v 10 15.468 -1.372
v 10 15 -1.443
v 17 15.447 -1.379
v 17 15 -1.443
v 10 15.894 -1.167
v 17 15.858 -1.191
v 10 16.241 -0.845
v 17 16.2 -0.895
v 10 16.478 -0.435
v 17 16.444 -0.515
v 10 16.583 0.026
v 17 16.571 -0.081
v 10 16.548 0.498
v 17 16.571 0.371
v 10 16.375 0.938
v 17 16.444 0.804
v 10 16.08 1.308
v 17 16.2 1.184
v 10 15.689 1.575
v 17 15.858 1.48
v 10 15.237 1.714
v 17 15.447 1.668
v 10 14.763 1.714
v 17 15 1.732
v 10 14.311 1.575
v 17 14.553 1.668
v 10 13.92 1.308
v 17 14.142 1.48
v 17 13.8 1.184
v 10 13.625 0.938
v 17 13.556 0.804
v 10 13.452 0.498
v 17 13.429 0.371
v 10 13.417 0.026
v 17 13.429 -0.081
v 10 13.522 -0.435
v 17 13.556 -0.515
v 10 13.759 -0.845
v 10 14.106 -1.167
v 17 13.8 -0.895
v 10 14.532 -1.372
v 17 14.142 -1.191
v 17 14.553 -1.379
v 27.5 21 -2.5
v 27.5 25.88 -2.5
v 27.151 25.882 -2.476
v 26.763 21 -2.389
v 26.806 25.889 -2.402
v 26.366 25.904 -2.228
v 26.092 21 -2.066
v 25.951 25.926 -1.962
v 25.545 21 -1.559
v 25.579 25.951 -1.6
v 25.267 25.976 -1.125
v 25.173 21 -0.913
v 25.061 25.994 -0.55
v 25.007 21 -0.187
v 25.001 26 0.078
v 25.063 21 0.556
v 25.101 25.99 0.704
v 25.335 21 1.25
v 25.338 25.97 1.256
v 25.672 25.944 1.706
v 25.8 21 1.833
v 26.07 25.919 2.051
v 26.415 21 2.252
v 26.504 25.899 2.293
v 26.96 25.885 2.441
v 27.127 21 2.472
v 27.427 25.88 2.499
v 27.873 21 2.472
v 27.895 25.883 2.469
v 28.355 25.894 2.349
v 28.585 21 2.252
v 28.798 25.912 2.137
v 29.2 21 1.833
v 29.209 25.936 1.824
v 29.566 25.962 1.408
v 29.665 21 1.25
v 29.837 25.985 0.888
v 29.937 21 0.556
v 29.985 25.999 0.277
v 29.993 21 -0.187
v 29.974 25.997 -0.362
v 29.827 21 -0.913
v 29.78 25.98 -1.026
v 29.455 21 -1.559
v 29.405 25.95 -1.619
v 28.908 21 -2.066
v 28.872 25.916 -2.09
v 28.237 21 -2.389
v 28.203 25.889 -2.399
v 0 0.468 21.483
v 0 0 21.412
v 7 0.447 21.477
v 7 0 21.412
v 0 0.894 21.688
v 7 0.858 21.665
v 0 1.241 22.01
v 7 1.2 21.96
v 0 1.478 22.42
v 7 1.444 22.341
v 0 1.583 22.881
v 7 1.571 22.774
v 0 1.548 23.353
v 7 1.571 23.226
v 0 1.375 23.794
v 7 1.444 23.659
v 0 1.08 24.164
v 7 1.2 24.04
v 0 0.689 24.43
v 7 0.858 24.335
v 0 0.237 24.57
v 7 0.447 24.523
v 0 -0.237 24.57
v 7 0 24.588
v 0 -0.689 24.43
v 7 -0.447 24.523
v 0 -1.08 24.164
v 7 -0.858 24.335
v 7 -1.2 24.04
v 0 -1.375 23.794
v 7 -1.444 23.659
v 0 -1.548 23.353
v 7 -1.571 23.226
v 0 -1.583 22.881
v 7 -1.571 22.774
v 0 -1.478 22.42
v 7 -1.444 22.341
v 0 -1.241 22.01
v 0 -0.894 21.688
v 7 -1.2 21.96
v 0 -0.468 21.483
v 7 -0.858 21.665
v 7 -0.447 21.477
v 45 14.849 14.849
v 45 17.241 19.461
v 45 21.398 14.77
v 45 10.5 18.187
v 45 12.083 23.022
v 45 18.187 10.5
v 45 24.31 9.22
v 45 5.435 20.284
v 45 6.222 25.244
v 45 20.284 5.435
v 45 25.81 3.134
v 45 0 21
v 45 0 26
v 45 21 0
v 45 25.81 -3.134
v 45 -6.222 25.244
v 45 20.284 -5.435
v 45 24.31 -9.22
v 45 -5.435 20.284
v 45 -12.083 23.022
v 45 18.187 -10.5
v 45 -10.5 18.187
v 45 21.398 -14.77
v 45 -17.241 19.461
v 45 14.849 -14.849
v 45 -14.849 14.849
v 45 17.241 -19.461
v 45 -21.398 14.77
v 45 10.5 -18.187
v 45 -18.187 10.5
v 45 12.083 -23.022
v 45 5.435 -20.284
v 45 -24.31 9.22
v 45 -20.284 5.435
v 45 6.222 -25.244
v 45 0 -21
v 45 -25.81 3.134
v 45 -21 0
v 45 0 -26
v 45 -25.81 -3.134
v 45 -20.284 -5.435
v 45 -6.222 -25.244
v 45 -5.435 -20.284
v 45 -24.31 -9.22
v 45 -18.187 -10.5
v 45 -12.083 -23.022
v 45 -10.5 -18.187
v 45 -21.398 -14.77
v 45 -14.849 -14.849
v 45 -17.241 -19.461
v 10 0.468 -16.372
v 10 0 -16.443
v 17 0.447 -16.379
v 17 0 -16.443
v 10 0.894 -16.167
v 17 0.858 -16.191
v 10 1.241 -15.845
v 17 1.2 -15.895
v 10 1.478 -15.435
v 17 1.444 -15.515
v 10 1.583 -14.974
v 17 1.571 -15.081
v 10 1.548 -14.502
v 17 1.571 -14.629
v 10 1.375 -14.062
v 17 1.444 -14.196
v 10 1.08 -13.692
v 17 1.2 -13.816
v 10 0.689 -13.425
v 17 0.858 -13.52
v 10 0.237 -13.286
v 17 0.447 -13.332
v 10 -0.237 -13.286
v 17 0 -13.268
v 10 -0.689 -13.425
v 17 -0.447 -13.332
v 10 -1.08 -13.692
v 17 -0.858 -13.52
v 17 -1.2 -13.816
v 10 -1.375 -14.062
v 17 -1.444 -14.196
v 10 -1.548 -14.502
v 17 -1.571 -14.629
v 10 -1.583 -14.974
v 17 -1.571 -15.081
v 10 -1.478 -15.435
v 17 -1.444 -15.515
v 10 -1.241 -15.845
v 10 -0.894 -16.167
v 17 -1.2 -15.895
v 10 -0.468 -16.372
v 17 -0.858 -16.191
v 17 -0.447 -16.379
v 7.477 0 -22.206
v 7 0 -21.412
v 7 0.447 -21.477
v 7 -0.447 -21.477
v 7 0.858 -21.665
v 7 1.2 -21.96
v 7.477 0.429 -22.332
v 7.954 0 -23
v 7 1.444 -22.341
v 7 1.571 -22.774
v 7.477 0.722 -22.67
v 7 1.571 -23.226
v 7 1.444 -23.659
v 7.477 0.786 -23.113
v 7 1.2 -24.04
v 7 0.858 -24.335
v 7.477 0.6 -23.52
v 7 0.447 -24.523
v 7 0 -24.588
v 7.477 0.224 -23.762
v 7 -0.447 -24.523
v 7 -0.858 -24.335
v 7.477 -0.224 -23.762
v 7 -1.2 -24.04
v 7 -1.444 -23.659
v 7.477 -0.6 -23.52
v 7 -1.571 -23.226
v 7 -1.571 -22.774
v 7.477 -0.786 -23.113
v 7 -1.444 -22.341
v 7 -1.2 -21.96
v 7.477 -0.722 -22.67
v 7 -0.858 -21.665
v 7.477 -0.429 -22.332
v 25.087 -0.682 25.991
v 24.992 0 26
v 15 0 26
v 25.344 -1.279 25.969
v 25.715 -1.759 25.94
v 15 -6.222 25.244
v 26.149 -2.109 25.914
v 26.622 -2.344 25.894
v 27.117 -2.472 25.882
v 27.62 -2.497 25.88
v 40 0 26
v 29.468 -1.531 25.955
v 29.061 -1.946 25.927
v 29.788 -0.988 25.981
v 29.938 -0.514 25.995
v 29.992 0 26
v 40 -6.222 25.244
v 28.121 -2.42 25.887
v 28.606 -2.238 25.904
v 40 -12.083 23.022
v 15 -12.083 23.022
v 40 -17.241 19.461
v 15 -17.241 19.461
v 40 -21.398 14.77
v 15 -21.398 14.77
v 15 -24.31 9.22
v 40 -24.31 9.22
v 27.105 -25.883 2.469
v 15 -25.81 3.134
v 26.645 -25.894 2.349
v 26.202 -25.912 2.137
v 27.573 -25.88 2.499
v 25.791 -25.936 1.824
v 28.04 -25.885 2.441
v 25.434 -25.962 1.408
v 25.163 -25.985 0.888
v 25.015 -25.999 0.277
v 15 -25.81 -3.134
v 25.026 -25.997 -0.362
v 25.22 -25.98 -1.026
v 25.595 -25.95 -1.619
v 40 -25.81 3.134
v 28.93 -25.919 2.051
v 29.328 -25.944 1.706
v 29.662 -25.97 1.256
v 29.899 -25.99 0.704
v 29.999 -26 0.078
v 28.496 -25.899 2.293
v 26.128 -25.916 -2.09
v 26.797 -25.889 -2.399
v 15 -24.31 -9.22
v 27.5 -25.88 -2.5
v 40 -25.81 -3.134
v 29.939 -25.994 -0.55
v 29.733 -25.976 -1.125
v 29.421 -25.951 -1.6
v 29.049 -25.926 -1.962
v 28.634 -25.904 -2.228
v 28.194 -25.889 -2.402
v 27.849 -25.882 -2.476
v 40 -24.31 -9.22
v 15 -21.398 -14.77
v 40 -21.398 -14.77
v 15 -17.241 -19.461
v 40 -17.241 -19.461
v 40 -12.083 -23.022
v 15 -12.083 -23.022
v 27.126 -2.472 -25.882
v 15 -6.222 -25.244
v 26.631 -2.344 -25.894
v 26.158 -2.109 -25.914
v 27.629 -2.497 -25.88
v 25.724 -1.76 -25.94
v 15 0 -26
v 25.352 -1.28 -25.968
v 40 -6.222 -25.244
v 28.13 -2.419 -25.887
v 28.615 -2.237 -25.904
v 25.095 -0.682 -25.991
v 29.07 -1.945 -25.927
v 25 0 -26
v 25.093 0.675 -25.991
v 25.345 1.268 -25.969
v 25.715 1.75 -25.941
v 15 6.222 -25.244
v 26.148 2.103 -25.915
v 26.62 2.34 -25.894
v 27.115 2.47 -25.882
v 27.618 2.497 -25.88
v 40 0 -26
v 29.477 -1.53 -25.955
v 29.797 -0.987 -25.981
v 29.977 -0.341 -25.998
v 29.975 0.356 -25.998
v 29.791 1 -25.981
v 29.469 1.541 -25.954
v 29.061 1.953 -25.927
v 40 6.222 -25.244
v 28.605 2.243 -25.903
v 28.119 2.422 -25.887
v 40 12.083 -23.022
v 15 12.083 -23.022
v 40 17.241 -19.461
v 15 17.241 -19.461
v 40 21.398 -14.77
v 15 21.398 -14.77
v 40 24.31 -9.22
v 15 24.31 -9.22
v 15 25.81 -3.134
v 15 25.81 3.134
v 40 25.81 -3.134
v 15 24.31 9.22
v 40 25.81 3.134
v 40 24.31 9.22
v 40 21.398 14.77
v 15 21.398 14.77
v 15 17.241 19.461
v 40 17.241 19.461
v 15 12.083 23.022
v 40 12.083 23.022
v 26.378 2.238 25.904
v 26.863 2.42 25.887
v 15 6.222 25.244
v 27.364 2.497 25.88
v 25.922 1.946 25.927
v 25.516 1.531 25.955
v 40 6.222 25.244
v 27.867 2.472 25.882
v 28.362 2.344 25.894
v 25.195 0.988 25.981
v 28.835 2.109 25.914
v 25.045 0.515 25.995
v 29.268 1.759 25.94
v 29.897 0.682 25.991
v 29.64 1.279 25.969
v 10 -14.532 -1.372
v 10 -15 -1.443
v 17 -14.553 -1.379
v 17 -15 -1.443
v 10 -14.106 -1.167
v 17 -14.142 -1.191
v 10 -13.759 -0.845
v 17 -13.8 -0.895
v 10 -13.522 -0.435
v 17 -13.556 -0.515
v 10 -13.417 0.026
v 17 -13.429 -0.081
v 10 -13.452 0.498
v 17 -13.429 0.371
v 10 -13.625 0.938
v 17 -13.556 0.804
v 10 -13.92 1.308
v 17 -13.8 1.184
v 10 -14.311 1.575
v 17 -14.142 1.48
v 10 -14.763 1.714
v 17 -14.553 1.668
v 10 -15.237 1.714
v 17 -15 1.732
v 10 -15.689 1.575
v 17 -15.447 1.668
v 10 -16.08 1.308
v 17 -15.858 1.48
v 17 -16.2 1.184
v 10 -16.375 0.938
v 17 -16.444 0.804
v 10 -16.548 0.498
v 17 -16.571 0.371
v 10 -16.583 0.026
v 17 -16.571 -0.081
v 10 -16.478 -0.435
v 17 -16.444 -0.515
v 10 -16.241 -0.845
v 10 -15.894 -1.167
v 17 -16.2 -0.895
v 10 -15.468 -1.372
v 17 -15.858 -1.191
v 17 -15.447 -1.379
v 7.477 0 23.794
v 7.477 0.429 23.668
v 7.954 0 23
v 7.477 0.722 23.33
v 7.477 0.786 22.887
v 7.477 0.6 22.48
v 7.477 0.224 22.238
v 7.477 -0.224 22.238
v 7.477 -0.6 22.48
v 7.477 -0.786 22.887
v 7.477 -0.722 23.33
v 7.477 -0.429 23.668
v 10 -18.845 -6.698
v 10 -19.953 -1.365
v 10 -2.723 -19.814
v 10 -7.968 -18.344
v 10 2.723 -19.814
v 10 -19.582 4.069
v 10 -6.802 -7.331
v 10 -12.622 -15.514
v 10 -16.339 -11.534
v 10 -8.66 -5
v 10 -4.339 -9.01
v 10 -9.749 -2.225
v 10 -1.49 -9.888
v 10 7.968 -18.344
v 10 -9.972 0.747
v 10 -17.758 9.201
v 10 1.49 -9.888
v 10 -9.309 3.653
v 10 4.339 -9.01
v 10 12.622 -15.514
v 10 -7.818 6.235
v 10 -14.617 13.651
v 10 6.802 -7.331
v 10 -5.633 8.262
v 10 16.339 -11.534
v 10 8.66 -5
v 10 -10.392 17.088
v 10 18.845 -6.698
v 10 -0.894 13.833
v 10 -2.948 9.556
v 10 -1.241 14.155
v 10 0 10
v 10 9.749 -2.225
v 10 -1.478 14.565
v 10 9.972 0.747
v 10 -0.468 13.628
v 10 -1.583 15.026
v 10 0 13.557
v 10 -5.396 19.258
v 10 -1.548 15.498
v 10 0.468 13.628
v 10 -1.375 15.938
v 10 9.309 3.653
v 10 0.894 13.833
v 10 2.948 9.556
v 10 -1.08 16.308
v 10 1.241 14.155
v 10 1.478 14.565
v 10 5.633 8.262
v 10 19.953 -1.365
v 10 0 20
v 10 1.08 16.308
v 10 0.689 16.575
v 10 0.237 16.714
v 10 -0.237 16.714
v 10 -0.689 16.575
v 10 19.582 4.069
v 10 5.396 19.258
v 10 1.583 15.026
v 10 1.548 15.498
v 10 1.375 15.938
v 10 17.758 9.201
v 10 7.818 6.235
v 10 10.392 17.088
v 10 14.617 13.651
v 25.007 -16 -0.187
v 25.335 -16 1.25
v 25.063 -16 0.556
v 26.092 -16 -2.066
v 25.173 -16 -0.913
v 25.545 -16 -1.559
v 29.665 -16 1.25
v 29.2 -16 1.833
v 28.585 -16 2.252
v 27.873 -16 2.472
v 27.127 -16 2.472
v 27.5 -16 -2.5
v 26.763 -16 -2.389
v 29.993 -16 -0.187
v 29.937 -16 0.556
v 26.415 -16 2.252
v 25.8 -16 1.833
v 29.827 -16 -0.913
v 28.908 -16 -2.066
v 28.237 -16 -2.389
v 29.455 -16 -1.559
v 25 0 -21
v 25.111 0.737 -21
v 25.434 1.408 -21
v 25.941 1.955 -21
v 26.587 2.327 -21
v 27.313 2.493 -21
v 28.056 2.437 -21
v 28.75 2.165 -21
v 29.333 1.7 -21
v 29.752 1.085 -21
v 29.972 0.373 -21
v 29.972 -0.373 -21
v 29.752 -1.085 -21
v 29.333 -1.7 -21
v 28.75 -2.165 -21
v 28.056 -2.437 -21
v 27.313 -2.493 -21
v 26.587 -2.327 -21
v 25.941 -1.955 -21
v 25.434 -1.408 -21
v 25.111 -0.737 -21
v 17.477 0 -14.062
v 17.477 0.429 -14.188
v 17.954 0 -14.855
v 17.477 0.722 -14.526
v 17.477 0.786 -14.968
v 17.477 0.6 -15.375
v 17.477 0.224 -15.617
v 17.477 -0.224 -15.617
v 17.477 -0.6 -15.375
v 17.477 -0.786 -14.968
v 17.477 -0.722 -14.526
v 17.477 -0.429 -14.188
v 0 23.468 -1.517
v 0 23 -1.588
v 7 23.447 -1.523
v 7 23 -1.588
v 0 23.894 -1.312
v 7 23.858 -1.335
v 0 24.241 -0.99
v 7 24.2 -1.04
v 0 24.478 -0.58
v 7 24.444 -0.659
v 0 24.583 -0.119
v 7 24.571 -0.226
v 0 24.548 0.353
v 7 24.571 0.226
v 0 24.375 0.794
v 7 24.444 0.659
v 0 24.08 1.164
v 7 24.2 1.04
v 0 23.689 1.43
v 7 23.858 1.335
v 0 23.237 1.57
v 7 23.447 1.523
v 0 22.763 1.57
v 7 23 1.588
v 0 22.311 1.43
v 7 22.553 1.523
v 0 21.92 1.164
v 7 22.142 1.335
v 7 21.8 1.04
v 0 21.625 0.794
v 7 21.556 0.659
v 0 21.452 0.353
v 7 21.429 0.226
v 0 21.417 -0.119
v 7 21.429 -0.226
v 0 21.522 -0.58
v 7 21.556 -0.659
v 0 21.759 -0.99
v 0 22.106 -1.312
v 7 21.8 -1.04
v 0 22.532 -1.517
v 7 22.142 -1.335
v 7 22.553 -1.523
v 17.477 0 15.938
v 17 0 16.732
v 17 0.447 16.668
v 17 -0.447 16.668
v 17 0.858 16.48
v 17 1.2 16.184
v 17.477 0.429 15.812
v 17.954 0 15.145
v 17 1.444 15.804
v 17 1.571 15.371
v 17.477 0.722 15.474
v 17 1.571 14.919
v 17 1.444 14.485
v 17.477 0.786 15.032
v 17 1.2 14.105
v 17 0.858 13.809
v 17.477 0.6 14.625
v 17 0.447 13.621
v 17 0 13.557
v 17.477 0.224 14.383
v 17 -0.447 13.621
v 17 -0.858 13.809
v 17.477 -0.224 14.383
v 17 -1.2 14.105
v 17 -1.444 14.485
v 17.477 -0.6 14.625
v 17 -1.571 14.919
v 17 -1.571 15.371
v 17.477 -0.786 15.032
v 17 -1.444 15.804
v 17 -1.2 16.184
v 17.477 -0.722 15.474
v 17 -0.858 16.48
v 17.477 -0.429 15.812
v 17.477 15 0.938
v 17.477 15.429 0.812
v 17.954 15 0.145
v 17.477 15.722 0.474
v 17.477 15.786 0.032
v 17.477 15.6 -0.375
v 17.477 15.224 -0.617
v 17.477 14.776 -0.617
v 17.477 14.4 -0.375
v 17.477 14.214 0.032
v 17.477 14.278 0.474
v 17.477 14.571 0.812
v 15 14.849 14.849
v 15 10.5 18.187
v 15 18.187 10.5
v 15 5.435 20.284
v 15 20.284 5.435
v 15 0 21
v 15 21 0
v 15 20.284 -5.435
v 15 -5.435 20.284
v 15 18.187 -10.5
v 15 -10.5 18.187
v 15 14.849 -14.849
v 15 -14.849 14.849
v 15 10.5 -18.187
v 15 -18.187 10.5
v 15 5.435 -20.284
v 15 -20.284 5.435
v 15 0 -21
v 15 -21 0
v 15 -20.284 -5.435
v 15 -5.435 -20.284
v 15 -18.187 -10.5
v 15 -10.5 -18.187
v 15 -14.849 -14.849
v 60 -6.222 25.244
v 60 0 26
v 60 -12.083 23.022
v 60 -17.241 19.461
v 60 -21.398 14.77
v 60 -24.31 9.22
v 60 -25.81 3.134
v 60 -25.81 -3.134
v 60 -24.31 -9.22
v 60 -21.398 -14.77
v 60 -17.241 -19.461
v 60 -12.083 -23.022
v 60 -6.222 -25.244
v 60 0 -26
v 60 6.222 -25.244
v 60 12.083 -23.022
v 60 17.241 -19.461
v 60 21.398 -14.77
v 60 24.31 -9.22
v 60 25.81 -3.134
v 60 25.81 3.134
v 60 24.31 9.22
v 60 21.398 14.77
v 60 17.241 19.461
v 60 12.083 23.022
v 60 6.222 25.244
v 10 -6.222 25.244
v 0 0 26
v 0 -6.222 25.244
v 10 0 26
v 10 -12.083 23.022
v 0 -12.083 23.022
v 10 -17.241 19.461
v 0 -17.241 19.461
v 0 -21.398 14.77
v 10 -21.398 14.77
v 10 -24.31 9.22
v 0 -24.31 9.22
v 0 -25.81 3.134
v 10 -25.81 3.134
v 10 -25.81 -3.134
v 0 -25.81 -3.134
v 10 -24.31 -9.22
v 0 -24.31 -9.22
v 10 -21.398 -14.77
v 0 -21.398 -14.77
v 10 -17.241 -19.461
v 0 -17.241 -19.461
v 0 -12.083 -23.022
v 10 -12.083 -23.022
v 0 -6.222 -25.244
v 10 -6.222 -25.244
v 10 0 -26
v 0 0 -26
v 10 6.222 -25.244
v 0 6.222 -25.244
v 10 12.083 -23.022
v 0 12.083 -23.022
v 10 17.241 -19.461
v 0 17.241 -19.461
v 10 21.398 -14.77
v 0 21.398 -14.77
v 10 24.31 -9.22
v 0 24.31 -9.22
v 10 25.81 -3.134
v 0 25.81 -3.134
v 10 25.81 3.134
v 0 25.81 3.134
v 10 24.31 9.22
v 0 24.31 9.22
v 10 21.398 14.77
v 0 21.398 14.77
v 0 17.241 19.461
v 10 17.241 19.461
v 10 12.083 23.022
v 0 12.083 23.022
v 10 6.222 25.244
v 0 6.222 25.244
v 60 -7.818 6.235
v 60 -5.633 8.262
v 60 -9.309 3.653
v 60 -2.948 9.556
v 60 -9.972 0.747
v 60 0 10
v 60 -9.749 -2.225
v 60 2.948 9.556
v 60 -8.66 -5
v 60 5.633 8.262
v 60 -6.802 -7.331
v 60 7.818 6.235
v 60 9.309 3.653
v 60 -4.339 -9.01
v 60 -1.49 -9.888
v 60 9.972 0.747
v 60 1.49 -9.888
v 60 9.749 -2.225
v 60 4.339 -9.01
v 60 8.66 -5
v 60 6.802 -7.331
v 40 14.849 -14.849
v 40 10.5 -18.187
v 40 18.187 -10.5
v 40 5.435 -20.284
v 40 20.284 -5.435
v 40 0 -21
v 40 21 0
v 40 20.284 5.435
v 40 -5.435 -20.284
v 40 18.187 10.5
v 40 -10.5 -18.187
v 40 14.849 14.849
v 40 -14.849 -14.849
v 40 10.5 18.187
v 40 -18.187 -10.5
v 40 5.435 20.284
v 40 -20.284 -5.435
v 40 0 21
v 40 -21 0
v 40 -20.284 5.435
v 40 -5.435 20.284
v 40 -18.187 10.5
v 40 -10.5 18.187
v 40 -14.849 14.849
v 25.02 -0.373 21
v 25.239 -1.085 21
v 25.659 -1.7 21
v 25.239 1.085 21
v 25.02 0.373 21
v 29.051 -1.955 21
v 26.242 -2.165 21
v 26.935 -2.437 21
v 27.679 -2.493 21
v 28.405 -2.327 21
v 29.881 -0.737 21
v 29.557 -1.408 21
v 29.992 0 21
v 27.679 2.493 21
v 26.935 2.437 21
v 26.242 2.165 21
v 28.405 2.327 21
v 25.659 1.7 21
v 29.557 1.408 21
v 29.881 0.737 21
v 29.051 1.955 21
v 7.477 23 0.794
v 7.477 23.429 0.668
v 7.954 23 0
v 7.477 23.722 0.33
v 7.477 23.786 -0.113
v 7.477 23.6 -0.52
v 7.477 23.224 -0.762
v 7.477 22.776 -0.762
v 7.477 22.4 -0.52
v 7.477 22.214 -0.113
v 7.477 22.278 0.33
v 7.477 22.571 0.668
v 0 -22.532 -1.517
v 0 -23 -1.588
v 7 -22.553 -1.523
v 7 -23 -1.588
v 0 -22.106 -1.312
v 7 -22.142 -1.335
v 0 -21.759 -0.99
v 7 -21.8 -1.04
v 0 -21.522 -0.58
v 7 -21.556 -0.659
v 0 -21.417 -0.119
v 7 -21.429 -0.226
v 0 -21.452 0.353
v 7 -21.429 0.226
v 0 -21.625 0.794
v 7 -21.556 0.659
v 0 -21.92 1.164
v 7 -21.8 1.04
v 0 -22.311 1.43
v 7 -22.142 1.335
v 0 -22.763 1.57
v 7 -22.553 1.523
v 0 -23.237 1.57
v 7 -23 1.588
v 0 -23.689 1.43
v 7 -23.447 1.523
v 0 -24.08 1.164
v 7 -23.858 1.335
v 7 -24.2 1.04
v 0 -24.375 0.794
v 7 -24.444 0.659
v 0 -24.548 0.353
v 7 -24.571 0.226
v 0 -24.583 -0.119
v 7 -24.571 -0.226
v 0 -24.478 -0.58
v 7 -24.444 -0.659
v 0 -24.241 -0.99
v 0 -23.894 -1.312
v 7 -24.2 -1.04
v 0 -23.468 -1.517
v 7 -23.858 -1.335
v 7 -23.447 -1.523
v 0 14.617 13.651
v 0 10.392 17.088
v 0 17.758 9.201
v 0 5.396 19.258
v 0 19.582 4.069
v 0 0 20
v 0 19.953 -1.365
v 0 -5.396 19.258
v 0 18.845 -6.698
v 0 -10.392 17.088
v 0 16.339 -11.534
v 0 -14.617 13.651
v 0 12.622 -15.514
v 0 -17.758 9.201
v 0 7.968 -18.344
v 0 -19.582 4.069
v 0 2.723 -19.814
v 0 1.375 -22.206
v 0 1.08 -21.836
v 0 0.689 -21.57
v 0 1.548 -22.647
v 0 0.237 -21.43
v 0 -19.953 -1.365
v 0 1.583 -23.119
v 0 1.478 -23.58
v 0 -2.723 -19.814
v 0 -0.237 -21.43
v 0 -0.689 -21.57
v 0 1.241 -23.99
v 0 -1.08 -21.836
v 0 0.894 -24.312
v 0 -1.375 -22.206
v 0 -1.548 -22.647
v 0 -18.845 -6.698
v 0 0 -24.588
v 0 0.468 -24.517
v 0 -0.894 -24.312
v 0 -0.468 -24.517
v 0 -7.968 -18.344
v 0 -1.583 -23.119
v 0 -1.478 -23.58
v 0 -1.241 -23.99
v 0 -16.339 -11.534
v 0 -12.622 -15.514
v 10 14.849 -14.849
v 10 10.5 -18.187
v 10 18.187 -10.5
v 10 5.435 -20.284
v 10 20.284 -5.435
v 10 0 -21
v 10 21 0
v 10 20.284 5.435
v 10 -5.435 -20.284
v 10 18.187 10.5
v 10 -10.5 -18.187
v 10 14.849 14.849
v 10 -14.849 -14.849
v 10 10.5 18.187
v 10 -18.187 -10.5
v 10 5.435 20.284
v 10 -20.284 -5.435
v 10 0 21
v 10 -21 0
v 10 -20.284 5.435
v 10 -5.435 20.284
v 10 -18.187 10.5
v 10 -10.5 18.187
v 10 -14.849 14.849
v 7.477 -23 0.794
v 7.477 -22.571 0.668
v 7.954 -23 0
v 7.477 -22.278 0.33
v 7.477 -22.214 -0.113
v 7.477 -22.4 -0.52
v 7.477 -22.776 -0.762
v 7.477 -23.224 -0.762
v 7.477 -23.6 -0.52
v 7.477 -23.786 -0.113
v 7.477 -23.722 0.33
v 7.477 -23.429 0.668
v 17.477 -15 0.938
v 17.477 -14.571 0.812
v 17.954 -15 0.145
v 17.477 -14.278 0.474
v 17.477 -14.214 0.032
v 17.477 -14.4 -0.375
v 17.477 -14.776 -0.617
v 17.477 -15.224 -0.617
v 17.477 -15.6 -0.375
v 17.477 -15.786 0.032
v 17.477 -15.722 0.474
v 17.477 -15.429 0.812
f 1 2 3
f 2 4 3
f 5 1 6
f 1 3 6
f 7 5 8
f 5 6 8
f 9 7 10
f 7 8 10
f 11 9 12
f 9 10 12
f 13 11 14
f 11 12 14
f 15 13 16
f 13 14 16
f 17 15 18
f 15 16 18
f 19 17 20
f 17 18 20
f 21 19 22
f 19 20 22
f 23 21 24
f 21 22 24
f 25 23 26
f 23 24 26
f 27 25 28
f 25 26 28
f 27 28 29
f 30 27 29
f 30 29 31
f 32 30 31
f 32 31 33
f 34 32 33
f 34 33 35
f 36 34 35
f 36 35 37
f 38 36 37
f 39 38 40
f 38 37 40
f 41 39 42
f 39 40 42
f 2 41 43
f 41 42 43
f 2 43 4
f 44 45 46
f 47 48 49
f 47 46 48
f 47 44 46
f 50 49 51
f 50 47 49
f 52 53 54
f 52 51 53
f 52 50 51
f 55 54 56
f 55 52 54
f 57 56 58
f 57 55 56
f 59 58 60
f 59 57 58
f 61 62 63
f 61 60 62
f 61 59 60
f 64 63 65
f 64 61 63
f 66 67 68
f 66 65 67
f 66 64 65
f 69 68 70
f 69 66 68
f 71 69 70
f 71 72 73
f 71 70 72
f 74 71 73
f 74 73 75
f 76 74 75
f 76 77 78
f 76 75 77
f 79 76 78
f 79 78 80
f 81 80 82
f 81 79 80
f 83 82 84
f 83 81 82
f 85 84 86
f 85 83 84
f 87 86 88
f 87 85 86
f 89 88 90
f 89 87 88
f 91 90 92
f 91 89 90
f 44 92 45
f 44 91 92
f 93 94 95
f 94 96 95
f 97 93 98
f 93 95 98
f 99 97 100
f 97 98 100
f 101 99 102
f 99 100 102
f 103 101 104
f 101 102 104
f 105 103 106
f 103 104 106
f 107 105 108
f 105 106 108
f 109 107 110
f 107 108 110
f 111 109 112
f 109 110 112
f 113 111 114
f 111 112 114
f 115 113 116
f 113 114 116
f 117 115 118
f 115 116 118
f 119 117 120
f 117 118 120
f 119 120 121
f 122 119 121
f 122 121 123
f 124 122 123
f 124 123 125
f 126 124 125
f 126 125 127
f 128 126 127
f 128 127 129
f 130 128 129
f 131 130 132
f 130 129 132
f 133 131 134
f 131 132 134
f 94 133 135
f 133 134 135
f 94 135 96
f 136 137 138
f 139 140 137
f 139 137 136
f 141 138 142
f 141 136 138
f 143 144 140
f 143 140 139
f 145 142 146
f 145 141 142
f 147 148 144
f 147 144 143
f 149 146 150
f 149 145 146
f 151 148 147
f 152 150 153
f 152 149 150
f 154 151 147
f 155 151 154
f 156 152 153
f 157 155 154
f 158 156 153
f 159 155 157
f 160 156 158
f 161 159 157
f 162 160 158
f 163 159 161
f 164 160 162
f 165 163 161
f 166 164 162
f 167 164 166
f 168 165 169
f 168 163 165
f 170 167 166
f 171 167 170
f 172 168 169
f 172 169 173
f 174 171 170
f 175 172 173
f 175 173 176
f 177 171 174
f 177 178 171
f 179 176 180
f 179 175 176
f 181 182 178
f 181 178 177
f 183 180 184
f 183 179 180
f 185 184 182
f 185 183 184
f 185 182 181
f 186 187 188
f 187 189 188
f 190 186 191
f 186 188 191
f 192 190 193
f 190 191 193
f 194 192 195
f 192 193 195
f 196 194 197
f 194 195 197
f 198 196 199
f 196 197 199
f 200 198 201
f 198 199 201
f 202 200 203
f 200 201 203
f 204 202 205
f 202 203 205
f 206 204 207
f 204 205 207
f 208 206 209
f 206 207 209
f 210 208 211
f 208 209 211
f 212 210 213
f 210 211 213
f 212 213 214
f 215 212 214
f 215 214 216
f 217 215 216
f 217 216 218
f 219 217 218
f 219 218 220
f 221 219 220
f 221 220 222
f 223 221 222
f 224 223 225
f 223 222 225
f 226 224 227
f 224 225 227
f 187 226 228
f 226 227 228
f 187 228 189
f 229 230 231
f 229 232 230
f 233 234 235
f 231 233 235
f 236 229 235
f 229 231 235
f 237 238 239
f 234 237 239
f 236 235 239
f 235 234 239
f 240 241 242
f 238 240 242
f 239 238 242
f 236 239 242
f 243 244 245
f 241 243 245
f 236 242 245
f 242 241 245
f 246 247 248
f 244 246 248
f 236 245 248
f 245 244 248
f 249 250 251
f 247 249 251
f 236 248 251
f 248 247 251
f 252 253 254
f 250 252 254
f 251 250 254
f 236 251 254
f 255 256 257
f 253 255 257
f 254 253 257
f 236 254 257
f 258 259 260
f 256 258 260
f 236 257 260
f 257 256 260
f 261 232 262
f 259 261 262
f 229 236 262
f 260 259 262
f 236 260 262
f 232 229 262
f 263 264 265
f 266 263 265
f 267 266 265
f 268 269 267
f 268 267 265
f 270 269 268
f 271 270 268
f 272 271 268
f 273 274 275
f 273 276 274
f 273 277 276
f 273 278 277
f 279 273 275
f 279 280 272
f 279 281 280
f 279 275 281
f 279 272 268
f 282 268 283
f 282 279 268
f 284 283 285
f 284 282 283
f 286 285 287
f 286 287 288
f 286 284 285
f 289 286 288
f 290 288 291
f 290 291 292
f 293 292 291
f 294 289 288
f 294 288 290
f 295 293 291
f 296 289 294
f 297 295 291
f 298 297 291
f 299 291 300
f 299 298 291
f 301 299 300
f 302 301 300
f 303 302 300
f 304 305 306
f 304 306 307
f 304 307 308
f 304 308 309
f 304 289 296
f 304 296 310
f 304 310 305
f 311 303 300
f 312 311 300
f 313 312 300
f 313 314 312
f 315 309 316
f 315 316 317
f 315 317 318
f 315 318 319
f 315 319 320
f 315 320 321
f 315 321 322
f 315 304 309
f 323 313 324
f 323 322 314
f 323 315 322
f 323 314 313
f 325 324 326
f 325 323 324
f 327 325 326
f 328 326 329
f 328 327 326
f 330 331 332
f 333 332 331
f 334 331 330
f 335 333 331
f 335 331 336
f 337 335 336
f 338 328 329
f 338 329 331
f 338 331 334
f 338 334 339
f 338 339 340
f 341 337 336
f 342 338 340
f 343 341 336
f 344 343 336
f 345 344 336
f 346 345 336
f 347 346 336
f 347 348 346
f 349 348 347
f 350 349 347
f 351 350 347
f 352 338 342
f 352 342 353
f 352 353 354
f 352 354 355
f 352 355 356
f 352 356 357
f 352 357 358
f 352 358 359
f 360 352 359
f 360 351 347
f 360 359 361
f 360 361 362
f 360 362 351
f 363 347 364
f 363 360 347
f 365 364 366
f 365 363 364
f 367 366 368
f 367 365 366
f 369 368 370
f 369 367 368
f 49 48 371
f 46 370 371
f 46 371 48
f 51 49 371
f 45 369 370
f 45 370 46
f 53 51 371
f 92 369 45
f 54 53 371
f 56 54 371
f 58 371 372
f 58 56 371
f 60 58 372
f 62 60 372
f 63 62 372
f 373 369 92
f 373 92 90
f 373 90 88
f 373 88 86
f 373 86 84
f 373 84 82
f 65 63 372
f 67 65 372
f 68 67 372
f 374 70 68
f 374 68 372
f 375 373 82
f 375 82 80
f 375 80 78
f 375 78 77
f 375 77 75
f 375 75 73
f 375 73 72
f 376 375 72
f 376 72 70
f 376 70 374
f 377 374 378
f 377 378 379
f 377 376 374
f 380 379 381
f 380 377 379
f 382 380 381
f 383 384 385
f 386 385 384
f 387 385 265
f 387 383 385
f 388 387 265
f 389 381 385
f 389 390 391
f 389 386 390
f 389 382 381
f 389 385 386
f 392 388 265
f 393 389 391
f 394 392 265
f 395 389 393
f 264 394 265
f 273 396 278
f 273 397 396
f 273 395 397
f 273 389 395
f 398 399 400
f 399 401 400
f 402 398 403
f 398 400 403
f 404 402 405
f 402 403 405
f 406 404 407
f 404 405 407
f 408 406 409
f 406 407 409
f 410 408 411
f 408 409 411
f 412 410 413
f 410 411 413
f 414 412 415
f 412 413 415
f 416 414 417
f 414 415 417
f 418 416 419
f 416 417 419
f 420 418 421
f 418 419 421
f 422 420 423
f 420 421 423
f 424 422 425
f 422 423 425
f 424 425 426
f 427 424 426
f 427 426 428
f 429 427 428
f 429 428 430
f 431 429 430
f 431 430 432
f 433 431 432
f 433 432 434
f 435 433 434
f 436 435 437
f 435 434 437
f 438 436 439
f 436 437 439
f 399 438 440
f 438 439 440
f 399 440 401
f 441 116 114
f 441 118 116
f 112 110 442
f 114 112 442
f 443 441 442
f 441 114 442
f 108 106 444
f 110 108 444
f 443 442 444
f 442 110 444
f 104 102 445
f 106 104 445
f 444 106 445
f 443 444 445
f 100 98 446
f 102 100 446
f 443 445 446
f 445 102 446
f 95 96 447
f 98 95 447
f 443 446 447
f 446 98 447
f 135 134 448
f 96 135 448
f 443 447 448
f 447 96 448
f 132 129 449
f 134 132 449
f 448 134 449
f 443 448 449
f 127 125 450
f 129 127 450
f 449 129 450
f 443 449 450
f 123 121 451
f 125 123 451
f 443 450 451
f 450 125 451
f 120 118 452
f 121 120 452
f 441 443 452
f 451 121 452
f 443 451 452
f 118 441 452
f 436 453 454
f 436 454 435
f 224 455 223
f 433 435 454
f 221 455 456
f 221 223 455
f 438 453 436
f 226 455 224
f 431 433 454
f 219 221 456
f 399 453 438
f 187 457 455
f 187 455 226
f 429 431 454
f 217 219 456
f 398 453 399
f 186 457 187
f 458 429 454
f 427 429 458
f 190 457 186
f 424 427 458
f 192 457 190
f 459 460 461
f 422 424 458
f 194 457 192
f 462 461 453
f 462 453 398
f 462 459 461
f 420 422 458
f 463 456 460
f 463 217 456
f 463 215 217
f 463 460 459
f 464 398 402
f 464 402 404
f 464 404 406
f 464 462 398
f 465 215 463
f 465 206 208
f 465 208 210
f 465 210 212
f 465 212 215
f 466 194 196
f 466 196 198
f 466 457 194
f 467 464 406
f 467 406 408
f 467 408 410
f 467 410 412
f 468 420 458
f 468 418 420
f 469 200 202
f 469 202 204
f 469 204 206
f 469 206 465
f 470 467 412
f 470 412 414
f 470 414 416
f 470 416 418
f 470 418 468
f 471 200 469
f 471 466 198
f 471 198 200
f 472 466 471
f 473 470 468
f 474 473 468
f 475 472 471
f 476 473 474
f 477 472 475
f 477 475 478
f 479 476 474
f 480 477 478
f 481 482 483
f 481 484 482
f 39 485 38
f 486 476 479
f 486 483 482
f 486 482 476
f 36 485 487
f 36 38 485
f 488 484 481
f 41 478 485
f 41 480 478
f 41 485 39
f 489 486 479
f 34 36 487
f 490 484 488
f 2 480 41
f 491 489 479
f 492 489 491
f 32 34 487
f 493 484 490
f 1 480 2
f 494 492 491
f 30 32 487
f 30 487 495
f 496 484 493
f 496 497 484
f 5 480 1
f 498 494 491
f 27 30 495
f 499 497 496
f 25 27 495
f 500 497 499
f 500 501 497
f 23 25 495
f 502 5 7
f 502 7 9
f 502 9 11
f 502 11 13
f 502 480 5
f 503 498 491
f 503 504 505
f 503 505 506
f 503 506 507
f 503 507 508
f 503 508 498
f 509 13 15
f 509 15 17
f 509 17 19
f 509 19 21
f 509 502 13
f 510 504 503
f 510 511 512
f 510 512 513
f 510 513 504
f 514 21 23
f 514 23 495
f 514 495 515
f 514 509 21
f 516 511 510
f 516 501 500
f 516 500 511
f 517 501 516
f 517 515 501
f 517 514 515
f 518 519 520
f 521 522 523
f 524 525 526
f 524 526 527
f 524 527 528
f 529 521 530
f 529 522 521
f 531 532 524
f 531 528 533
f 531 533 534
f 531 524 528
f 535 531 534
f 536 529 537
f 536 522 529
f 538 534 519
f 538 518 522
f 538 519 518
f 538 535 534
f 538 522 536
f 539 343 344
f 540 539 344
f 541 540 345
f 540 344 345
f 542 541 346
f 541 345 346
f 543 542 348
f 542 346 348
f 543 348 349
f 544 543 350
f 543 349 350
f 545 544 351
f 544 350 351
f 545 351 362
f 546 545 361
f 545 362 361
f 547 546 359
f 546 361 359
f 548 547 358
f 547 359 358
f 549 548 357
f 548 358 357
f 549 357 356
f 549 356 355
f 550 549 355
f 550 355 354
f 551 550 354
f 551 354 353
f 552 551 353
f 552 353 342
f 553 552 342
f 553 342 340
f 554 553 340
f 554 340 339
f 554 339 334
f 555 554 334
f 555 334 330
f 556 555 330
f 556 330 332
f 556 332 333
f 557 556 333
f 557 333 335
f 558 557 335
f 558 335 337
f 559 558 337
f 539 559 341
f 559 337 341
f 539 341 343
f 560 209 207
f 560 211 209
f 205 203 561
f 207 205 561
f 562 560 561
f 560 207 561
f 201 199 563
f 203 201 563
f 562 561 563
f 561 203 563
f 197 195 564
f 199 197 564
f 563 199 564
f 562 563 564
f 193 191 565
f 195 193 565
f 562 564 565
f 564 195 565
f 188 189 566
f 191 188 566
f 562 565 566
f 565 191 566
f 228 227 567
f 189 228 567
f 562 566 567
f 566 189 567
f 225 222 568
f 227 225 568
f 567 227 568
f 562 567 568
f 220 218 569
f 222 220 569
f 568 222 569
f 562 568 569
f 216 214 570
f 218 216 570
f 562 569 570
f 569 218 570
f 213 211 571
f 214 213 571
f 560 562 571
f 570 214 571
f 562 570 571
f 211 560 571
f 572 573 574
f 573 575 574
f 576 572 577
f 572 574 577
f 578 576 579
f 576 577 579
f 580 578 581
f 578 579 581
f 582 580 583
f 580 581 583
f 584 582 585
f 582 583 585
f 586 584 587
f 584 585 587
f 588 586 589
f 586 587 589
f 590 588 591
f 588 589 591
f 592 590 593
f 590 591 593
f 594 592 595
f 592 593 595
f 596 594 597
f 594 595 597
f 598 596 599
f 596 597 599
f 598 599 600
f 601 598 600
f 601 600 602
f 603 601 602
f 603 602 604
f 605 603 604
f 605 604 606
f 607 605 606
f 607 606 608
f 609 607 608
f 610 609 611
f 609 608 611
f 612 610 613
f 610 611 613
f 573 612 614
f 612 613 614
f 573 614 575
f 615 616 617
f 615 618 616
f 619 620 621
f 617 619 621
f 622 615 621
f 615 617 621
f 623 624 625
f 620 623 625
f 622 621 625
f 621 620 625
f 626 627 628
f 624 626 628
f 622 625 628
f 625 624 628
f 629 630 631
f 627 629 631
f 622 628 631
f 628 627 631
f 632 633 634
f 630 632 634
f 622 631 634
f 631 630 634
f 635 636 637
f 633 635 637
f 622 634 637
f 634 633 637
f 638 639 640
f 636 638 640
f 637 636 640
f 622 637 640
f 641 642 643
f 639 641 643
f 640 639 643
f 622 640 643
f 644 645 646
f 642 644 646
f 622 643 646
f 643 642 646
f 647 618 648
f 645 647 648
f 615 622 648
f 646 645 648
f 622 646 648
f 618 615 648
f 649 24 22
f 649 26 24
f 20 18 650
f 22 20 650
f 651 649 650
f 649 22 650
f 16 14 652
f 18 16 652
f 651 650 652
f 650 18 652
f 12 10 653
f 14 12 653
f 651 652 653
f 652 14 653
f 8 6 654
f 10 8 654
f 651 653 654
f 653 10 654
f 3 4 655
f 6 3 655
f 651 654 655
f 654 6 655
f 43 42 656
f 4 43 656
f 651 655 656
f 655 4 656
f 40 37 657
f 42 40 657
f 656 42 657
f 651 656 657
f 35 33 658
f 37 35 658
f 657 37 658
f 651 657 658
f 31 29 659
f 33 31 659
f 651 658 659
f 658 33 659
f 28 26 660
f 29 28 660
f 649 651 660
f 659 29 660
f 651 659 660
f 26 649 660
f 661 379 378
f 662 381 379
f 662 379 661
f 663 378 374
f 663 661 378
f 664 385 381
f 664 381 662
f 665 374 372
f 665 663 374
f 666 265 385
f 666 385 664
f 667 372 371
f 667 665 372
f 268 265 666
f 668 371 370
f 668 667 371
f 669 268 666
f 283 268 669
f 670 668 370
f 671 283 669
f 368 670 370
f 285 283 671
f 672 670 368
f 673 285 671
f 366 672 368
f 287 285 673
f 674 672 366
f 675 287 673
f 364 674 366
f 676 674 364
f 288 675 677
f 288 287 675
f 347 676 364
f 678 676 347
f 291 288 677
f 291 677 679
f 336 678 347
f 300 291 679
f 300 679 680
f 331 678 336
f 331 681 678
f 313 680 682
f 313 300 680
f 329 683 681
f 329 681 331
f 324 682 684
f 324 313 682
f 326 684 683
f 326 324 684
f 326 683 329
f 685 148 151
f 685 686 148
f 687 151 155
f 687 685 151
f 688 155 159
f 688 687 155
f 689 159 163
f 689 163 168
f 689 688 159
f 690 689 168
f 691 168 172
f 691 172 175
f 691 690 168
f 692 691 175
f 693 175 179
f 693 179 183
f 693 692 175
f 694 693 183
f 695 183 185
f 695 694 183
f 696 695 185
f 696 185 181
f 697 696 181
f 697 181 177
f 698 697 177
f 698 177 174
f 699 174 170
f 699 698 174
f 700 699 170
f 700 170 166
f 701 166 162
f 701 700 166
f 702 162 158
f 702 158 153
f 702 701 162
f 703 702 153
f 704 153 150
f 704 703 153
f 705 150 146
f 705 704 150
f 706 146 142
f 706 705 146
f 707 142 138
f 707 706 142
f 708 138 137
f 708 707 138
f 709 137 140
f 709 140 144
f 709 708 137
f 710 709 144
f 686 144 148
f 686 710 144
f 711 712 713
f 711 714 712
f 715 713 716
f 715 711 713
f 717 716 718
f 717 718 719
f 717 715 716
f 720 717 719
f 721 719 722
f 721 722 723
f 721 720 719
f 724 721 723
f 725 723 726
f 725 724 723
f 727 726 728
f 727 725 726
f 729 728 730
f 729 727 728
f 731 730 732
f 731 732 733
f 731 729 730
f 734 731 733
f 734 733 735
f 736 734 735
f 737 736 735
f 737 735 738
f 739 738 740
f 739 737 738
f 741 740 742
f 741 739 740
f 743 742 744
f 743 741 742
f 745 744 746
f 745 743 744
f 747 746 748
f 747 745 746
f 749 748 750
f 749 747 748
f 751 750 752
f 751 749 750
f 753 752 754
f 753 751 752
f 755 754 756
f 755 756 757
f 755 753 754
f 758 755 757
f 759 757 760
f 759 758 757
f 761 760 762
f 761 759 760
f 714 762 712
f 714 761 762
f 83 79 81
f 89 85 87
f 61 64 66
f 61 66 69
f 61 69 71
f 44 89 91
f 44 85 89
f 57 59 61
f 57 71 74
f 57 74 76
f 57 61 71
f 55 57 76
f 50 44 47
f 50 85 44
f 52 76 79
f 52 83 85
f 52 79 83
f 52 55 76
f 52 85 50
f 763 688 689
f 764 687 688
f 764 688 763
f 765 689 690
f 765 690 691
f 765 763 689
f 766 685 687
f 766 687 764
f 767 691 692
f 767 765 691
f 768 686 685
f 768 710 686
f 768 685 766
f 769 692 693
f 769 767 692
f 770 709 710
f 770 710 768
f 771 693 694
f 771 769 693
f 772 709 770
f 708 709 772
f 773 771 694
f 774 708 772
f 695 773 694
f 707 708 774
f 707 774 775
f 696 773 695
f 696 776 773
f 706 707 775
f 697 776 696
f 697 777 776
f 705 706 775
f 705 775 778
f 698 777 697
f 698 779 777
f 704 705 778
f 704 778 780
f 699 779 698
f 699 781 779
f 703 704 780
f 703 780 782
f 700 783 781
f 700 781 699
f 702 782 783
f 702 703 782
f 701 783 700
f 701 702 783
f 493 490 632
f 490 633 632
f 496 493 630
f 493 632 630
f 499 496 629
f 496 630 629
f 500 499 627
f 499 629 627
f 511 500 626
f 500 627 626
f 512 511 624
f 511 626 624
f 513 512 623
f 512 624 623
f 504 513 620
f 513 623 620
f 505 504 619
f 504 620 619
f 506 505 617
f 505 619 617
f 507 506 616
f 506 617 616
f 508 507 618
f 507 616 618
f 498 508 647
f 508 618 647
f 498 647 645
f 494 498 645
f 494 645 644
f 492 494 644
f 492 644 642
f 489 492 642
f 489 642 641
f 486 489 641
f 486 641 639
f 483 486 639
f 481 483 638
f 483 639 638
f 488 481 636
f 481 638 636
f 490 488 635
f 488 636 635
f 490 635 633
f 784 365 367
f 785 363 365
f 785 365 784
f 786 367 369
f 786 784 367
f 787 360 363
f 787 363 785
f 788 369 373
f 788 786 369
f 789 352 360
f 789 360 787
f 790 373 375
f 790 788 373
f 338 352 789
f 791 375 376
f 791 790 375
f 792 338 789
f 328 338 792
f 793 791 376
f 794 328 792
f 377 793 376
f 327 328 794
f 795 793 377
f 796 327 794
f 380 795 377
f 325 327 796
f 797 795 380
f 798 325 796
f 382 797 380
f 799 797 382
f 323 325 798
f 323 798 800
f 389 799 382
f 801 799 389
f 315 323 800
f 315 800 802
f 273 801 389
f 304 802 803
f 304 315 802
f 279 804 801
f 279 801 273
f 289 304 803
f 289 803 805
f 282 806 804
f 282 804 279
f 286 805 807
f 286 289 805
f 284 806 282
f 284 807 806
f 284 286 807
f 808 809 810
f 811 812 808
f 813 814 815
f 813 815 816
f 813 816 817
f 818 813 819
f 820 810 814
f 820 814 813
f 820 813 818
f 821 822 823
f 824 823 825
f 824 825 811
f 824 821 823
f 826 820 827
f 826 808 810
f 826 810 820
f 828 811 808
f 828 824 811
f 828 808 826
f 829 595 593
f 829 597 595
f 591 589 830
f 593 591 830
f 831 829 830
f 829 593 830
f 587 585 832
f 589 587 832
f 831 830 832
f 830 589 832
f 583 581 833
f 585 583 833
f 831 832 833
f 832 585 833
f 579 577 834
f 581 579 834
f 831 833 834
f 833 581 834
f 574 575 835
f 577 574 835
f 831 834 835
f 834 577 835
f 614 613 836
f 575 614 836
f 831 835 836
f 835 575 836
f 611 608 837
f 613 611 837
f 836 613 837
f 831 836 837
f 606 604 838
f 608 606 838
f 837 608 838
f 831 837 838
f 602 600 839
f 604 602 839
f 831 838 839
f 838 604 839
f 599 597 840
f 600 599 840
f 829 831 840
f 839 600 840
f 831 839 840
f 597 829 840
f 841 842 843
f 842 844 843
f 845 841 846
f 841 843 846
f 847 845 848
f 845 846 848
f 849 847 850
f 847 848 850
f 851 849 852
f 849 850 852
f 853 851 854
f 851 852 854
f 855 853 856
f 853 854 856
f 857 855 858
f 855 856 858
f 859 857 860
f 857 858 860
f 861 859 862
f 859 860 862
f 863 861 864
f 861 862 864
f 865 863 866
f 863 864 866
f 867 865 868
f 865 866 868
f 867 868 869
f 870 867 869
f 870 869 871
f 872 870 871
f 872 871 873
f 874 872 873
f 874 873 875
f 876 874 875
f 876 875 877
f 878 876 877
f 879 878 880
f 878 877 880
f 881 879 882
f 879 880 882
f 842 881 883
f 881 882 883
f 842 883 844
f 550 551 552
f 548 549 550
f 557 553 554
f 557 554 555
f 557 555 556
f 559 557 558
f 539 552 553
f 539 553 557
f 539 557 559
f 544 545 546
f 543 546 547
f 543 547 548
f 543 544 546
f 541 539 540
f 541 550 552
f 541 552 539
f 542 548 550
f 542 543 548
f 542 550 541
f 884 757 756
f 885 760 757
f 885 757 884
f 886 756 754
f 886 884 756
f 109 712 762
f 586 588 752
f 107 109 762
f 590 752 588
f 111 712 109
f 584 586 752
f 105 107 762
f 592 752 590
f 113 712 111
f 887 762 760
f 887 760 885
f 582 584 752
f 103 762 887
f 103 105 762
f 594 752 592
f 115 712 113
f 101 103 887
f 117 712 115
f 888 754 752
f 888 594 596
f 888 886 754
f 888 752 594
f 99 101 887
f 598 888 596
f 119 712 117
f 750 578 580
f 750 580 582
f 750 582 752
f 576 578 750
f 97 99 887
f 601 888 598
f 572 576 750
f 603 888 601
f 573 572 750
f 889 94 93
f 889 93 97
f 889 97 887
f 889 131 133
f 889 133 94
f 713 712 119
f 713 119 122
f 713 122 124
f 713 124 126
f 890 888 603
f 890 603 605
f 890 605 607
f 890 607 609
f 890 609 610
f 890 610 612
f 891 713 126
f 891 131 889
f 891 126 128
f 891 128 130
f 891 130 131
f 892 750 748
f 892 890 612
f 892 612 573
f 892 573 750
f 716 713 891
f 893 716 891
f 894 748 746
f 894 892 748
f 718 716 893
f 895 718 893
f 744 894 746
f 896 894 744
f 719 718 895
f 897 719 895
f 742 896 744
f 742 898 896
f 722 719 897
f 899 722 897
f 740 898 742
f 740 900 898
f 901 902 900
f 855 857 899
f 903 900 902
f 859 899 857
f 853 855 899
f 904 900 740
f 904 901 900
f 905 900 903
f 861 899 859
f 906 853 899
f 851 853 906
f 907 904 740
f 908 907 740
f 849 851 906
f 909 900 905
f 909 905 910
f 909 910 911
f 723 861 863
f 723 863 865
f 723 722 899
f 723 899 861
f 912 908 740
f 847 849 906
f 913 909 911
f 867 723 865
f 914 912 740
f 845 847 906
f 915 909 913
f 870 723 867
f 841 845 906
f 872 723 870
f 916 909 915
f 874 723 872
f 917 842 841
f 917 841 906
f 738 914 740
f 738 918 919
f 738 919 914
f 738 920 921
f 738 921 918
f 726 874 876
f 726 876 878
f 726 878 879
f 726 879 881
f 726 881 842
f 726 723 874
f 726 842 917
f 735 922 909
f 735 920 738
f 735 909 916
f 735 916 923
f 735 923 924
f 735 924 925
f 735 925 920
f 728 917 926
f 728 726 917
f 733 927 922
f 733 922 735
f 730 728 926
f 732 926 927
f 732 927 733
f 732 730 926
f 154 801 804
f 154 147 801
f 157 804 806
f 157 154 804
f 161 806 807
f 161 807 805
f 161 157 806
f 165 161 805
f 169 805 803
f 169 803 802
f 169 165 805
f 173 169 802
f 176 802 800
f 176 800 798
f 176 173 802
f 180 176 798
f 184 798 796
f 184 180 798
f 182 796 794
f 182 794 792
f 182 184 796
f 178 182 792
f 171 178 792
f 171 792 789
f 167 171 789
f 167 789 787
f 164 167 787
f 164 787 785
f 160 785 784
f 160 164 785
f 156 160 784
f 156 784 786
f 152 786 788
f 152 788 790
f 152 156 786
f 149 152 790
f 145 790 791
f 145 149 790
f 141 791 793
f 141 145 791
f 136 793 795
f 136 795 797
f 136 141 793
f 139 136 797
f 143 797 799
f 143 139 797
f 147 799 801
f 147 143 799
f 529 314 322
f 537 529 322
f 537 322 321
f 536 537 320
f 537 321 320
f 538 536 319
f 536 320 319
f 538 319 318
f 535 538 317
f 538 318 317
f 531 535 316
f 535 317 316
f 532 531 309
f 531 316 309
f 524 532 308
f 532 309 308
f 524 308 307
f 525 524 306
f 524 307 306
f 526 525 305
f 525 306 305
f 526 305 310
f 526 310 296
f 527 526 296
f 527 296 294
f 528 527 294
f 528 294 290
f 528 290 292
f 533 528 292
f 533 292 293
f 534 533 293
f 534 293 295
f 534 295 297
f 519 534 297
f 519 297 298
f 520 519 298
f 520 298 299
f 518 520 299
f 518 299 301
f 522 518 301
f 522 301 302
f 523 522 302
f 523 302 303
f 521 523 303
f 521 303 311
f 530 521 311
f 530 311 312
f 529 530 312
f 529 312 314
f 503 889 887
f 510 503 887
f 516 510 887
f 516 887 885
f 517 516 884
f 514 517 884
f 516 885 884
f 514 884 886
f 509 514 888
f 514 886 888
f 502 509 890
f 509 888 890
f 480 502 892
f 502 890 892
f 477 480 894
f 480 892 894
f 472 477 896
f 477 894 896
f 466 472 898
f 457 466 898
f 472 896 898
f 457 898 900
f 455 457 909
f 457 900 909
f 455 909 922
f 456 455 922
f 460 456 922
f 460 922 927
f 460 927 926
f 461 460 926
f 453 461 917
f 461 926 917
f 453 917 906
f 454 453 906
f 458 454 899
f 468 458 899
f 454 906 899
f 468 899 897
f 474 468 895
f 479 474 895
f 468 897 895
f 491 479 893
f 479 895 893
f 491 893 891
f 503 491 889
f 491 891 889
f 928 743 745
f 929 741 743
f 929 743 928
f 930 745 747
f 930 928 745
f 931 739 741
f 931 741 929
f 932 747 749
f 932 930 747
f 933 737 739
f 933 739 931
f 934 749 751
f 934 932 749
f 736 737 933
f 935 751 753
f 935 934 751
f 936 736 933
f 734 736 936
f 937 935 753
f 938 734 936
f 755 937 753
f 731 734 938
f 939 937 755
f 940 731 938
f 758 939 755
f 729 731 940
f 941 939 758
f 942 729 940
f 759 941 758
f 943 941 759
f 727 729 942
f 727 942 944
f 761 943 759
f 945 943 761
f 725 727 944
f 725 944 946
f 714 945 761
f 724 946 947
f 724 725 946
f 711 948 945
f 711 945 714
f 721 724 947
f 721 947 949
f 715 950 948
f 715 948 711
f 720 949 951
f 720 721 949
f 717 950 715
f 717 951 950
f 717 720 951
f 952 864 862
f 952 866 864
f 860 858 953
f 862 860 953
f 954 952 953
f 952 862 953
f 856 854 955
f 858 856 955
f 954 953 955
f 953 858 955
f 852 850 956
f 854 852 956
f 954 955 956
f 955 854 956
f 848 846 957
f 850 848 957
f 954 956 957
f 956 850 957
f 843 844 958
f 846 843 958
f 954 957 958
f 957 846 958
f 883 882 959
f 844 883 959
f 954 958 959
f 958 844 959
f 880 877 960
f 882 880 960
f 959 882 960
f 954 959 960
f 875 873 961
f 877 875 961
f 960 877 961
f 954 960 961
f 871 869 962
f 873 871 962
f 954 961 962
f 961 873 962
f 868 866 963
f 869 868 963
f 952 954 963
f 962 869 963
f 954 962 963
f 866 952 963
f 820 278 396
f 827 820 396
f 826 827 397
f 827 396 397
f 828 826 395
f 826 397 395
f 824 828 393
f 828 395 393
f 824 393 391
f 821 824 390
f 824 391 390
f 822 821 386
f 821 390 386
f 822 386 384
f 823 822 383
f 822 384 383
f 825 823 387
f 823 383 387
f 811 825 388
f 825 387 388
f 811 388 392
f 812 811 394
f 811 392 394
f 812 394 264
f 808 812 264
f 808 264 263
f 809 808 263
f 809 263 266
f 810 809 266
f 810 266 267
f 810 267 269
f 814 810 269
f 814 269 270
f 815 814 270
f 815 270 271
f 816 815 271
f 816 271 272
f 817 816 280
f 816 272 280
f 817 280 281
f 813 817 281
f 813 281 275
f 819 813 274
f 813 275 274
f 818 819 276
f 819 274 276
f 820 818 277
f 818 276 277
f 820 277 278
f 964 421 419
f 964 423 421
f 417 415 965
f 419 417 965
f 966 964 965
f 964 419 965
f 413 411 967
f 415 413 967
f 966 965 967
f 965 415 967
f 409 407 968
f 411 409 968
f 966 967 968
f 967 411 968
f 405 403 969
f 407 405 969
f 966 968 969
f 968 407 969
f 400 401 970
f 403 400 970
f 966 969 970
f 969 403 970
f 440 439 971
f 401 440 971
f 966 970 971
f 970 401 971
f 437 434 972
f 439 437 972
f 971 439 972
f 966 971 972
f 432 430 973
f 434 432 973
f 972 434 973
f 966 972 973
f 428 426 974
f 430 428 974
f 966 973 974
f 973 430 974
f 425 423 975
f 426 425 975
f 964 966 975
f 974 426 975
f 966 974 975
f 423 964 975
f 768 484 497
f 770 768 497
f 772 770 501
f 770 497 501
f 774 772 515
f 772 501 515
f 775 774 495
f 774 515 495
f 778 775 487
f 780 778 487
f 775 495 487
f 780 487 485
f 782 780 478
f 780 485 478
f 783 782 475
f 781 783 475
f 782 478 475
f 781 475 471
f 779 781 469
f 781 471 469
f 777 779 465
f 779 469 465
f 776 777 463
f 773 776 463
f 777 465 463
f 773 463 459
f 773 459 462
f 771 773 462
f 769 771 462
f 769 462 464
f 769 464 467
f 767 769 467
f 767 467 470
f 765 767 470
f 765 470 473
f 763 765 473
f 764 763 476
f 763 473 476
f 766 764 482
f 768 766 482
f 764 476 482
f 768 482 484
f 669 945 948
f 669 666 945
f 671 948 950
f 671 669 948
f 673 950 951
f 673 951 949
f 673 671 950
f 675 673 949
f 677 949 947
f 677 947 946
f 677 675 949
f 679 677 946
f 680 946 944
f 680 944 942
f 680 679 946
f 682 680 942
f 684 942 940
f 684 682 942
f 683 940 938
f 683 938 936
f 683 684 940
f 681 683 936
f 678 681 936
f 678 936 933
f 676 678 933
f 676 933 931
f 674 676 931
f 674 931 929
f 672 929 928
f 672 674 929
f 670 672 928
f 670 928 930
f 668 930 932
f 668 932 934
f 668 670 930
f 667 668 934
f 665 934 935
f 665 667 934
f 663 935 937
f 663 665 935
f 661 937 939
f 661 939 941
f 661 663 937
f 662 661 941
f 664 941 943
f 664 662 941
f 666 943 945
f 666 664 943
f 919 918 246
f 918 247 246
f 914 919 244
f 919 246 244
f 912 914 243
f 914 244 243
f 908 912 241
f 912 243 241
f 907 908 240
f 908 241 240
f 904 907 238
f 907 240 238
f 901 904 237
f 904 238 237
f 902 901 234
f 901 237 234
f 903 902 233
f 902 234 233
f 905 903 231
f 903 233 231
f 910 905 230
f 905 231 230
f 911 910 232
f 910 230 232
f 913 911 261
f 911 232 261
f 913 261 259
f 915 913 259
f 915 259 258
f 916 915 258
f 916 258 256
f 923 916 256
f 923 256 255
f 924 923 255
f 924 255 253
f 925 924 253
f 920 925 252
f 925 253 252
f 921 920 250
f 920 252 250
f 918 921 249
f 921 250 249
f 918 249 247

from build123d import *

# Parameters (mm, degrees)
SKETCH2_R                        = 20
CUT_EXTRUDE2_DEPTH               = 10
F_1_8_0_125_DIAMETER_HOLE1_D     = 3.175
F_1_8_0_125_DIAMETER_HOLE1_DEPTH = 7
F_1_8_0_125_DIAMETER_HOLE1_TIP   = 0.953866233
SKETCH6_R                        = 10
CUT_EXTRUDE3_DEPTH               = 50
F_1_2_0_5_DIAMETER_HOLE1_D       = 12.7
SKETCH10_R                       = 2.5
CUT_EXTRUDE8_DEPTH               = 5
SKETCH11_R                       = 2.5
CUT_EXTRUDE9_DEPTH               = 5
SKETCH12_R                       = 2.5
CUT_EXTRUDE10_DEPTH              = 5
SKETCH13_R                       = 2.5
CUT_EXTRUDE11_DEPTH              = 5
CUT_EXTRUDE12_START              = -5
SKETCH14_R                       = 2.5
CUT_EXTRUDE12_DEPTH              = 5
SKETCH15_R                       = 5
CUT_EXTRUDE13_DEPTH              = 103.225241501
SKETCH16_R                       = 45
CUT_EXTRUDE14_DEPTH              = 20
F_1_8_0_125_DIAMETER_HOLE2_D     = 3.175
F_1_8_0_125_DIAMETER_HOLE2_DEPTH = 7
F_1_8_0_125_DIAMETER_HOLE2_TIP   = 0.953866233


with BuildPart() as part:
    # Sketch1 → Revolve1 (revolve)
    with BuildSketch(Plane.XY, mode=Mode.PRIVATE) as revolve1_sk:
        Polygon((0, 0), (0, 26), (10, 26), (10, 21), (15, 21), (15, 26), (40, 26), (40, 21), (45, 21), (45, 26), (60, 26), (60, 45), (80, 45), (80, 0), align=None)
    revolve(revolve1_sk.sketch.rotate(Axis((0, 0, 0), (1, 0, 0)), 90), axis=Axis((0, 0, 0), (1, 0, 0)))

    # Sketch2 → Cut-Extrude2 (cut)
    with BuildSketch(Plane.ZY):
        Circle(SKETCH2_R)
    extrude(amount=-CUT_EXTRUDE2_DEPTH, mode=Mode.SUBTRACT)

    # 1/8 (0.125) Diameter Hole1
    with Locations(Plane.ZY.offset(-10)):
        with Locations((15.144669257, 0), (0.144669257, -15), (-14.855330743, 0), (0.144669257, 15)):
            Hole(F_1_8_0_125_DIAMETER_HOLE1_D / 2, depth=F_1_8_0_125_DIAMETER_HOLE1_DEPTH)
            with Locations((0, 0, -(F_1_8_0_125_DIAMETER_HOLE1_DEPTH + F_1_8_0_125_DIAMETER_HOLE1_TIP / 2))):  # 118° drill point
                Cone(0, F_1_8_0_125_DIAMETER_HOLE1_D / 2, F_1_8_0_125_DIAMETER_HOLE1_TIP, mode=Mode.SUBTRACT)

    # Sketch6 → Cut-Extrude3 (cut)
    with BuildSketch(Plane.ZY.offset(-10)):
        Circle(SKETCH6_R)
    extrude(amount=-CUT_EXTRUDE3_DEPTH, mode=Mode.SUBTRACT)

    # 1/2 (0.5) Diameter Hole1 (through all)
    with Locations(Plane(origin=(80, 0, 0), x_dir=(0, 0, -1), z_dir=(1, 0, 0))):
        with Locations((0, 0)):
            Hole(F_1_2_0_5_DIAMETER_HOLE1_D / 2)

    # Sketch10 → Cut-Extrude8 (cut)
    with BuildSketch(Plane(origin=(0, -26, 26), x_dir=(1, 0, 0), z_dir=(0, 0, 1))):
        with Locations((27.491787802, 26)):
            Circle(SKETCH10_R)
    extrude(amount=-CUT_EXTRUDE8_DEPTH, mode=Mode.SUBTRACT)

    # Sketch11 → Cut-Extrude9 (cut)
    with BuildSketch(Plane(origin=(0, 0, -26), x_dir=(-1, 0, 0), z_dir=(0, 0, -1))):
        with Locations((-27.5, 0)):
            Circle(SKETCH11_R)
    extrude(amount=-CUT_EXTRUDE9_DEPTH, mode=Mode.SUBTRACT)

    # Sketch12 → Cut-Extrude10 (cut)
    with BuildSketch(Plane(origin=(0, -26, 0), x_dir=(-1, 0, 0), z_dir=(0, -1, 0))):
        with Locations(Location((-27.5, 0, 0), (0, 0, 90))):
            Circle(SKETCH12_R)
    extrude(amount=-CUT_EXTRUDE10_DEPTH, mode=Mode.SUBTRACT)

    # Sketch13 → Cut-Extrude11 (cut)
    with BuildSketch(Plane(origin=(0, -21, 0), x_dir=(-1, 0, 0), z_dir=(0, -1, 0))):
        with Locations(Location((-27.5, 0, 0), (0, 0, 90))):
            Circle(SKETCH13_R)
    extrude(amount=-CUT_EXTRUDE11_DEPTH, mode=Mode.SUBTRACT)

    # Sketch14 → Cut-Extrude12 (cut)
    with BuildSketch(Plane(origin=(0, 26, 0), x_dir=(1, 0, 0), z_dir=(0, 1, 0)).offset(CUT_EXTRUDE12_START)):
        with Locations(Location((27.5, 0, 0), (0, 0, 90))):
            Circle(SKETCH14_R)
    extrude(amount=CUT_EXTRUDE12_DEPTH, mode=Mode.SUBTRACT)

    # Sketch15 → Cut-Extrude13 (cut, through all)
    with BuildSketch(Plane(origin=(80, 0, 0), x_dir=(0, 0, -1), z_dir=(1, 0, 0))):
        with Locations((0, -35)):
            Circle(SKETCH15_R)
        with Locations((-35, 0)):
            Circle(SKETCH15_R)
        with Locations((0, 35)):
            Circle(SKETCH15_R)
        with Locations((35, 0)):
            Circle(SKETCH15_R)
    extrude(amount=-CUT_EXTRUDE13_DEPTH, mode=Mode.SUBTRACT)

    # Sketch16 → Cut-Extrude14 (cut)
    with BuildSketch(Plane(origin=(80, 0, 0), x_dir=(0, 0, -1), z_dir=(1, 0, 0))):
        Circle(SKETCH16_R)
    extrude(amount=-CUT_EXTRUDE14_DEPTH, mode=Mode.SUBTRACT)

    # 1/8 (0.125) Diameter Hole2
    with Locations(Plane.ZY):
        with Locations((0, 23), (23, 0), (0, -23), (-23, 0)):
            Hole(F_1_8_0_125_DIAMETER_HOLE2_D / 2, depth=F_1_8_0_125_DIAMETER_HOLE2_DEPTH)
            with Locations((0, 0, -(F_1_8_0_125_DIAMETER_HOLE2_DEPTH + F_1_8_0_125_DIAMETER_HOLE2_TIP / 2))):  # 118° drill point
                Cone(0, F_1_8_0_125_DIAMETER_HOLE2_D / 2, F_1_8_0_125_DIAMETER_HOLE2_TIP, mode=Mode.SUBTRACT)


solid = part.part
